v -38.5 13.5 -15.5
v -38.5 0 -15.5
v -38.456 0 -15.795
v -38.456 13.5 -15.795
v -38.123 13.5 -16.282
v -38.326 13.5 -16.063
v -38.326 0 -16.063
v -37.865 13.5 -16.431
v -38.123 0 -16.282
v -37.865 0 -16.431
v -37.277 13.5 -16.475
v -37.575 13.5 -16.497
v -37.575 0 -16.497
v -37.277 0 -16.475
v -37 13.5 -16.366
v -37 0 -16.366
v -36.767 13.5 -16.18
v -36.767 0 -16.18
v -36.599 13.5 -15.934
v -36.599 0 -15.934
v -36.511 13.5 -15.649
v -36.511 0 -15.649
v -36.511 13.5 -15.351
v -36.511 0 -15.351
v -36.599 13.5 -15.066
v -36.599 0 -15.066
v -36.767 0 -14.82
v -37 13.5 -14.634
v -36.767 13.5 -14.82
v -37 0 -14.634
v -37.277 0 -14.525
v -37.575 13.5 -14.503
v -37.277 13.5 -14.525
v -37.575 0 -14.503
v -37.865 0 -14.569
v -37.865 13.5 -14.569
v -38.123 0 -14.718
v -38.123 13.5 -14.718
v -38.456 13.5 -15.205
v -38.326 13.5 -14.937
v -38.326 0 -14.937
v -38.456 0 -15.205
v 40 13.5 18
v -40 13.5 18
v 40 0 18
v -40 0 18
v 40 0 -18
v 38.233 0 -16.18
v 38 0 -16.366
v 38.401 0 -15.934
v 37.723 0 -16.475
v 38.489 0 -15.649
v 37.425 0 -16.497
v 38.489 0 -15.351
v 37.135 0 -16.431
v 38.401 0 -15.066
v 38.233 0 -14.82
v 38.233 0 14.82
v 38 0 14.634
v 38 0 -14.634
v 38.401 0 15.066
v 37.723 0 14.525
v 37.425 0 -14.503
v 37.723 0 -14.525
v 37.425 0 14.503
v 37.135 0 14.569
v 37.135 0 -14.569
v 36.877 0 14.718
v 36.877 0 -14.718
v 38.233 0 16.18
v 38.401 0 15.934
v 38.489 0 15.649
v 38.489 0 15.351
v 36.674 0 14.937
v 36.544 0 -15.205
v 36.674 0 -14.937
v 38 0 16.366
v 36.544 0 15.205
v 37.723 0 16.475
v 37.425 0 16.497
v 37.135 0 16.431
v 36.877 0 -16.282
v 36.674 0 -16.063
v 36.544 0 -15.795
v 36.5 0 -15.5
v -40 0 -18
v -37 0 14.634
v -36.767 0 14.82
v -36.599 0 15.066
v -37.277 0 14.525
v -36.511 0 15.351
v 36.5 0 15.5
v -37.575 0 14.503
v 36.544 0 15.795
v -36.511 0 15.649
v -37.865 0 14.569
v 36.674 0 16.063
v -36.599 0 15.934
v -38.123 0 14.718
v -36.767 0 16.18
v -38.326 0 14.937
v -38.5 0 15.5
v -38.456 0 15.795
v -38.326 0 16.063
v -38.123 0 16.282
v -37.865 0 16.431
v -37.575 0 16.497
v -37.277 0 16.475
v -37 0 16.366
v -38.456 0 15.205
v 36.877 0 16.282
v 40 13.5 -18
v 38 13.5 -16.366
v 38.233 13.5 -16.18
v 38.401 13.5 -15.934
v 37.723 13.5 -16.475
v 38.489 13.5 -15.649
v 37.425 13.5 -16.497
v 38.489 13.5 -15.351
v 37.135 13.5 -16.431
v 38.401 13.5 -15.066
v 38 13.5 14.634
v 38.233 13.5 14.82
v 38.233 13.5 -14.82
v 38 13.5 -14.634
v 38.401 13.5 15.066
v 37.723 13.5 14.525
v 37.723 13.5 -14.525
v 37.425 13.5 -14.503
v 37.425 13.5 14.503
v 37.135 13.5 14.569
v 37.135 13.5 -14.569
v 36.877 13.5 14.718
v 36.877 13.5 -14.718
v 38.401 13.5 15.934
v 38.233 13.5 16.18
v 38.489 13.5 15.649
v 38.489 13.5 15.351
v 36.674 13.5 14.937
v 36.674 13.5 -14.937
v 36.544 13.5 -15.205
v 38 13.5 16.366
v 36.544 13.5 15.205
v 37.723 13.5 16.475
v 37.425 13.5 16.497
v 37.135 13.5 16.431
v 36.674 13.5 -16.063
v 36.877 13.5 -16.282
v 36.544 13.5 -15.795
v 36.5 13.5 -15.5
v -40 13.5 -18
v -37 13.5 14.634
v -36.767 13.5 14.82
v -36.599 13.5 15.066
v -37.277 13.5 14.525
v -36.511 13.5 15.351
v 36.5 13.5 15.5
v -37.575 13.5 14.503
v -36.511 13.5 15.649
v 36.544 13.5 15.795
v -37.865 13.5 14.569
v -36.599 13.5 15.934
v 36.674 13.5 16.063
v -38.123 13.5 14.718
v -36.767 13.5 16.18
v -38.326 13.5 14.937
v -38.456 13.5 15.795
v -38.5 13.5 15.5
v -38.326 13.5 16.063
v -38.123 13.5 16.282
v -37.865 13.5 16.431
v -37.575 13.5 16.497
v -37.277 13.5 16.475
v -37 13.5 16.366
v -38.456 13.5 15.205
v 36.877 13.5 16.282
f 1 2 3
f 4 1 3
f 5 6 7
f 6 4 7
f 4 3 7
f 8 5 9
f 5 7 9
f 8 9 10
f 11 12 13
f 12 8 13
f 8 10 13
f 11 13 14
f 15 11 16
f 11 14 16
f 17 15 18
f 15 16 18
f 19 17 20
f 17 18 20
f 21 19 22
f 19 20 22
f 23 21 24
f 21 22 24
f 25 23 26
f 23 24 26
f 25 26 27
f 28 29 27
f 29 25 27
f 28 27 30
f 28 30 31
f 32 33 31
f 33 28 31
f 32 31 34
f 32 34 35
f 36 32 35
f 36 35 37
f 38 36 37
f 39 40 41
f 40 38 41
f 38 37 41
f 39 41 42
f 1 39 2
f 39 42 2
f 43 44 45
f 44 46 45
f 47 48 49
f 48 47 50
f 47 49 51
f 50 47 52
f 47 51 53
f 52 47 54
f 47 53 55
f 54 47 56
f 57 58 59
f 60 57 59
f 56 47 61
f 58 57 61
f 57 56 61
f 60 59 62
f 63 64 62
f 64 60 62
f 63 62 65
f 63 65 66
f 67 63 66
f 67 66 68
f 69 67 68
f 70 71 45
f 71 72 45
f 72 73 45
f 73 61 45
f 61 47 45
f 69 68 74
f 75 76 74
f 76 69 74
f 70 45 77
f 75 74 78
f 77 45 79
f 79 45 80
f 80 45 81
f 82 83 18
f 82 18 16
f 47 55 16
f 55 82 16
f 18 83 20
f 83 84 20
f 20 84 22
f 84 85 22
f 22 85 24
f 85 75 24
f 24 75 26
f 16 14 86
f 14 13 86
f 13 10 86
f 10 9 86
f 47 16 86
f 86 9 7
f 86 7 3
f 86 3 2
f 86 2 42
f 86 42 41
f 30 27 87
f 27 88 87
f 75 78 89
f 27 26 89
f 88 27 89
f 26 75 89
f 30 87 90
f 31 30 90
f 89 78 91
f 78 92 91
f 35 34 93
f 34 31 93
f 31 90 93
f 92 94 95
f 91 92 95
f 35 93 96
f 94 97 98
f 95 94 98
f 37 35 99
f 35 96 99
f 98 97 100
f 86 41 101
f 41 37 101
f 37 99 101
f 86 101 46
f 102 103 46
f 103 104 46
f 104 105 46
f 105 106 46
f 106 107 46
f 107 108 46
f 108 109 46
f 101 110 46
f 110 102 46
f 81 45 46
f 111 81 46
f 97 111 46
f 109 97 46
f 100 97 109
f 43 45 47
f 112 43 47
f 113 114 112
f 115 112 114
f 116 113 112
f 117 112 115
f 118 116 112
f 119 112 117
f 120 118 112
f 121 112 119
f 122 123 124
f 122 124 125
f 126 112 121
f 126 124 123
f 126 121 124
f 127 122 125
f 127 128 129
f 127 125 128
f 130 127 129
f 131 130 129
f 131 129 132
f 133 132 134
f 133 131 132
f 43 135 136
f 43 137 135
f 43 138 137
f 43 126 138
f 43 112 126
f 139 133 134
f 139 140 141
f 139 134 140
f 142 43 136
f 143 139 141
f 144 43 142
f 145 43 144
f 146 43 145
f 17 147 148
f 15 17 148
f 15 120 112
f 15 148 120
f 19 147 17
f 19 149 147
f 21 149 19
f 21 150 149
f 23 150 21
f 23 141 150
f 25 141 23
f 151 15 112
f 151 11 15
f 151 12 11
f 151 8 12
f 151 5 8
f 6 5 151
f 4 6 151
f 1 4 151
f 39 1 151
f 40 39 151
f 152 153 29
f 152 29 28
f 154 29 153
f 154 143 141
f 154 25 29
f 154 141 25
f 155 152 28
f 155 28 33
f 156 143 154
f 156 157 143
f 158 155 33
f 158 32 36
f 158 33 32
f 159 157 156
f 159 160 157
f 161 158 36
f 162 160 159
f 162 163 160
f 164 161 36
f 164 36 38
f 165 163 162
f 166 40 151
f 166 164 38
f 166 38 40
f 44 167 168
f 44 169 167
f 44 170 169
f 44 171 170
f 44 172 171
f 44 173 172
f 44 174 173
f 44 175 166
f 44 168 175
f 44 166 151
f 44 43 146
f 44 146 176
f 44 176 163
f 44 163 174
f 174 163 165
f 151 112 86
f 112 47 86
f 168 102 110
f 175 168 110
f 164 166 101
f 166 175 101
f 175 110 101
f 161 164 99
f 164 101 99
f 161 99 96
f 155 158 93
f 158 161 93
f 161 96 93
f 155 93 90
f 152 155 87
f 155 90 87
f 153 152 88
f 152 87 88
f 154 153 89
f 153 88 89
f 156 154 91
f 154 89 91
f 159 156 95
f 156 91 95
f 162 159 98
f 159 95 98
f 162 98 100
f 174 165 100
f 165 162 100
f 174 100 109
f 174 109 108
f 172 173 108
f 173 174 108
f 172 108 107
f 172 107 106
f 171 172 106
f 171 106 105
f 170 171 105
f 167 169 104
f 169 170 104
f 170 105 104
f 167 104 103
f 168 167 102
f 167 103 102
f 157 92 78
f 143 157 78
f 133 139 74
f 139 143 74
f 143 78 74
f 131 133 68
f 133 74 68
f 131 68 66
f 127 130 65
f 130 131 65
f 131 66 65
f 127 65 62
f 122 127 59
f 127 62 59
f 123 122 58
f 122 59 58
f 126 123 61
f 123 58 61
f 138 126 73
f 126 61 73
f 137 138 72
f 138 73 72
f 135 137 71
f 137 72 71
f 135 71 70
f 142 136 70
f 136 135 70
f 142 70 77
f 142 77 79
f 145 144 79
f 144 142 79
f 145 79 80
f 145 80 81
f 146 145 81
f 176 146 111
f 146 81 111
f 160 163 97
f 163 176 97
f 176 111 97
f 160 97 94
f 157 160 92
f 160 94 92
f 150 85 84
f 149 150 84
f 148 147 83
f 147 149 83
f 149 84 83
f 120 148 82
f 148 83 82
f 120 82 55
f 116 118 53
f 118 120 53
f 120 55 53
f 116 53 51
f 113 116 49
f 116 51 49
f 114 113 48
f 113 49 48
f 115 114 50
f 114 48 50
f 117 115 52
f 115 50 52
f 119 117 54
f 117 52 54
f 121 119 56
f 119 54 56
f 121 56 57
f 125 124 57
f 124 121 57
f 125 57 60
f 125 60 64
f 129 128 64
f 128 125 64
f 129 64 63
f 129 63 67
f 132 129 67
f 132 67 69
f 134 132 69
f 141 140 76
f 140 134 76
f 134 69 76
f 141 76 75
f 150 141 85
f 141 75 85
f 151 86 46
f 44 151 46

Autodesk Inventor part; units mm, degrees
ref_plane "YZ Plane" through (0, 0, 0) normal (1, 0, 0) x (0, 1, 0)
ref_plane "XZ Plane" through (0, 0, 0) normal (0, 1, 0) x (-1, 0, 0)
ref_plane "XY Plane" through (0, 0, 0) normal (0, 0, 1) x (1, 0, 0)
sketch "Sketch1" plane through (0, 0, 0) normal (0, 1, 0) x (-1, 0, 0)
  line L0 (40, 18) -> (-40, 18)
  line L1 (-40, 18) -> (-40, -18)
  line L2 (-40, -18) -> (40, -18)
  line L3 (40, -18) -> (40, 18)
  circle A0 centre (37.5, -15.5) radius 1
  line L4 (37.5, -15.5) -> (-37.5, -15.5) construction
  line L5 (-37.5, -15.5) -> (-37.5, 15.5) construction
  line L6 (-37.5, 15.5) -> (37.5, 15.5) construction
  line L7 (37.5, 15.5) -> (37.5, -15.5) construction
  circle A1 centre (37.5, 15.5) radius 1
  circle A2 centre (-37.5, -15.5) radius 1
  circle A3 centre (-37.5, 15.5) radius 1
  point P0 (0, 0)
  dimension "d0" = 80
  dimension "d1" = 36
  dimension "d2" = 18
  dimension "d3" = 40
  dimension "d4" = 2
  dimension "d5" = 75
  dimension "d6" = 31
  dimension "d7" = 37.5
  dimension "d8" = 15.5
  dimension "d9" = 2
  dimension "d10" = 2
  dimension "d11" = 2
extrude "Extrusion1" add sketch "Sketch1" along normal blind 13.5
equation "\"d2\" = 0.5 * d1"
equation "\"d3\" = 0.5 * d0"
equation "\"d7\" = 0.5 * d5"
equation "\"d8\" = 0.5 * d6"
properties part number "LCD"
